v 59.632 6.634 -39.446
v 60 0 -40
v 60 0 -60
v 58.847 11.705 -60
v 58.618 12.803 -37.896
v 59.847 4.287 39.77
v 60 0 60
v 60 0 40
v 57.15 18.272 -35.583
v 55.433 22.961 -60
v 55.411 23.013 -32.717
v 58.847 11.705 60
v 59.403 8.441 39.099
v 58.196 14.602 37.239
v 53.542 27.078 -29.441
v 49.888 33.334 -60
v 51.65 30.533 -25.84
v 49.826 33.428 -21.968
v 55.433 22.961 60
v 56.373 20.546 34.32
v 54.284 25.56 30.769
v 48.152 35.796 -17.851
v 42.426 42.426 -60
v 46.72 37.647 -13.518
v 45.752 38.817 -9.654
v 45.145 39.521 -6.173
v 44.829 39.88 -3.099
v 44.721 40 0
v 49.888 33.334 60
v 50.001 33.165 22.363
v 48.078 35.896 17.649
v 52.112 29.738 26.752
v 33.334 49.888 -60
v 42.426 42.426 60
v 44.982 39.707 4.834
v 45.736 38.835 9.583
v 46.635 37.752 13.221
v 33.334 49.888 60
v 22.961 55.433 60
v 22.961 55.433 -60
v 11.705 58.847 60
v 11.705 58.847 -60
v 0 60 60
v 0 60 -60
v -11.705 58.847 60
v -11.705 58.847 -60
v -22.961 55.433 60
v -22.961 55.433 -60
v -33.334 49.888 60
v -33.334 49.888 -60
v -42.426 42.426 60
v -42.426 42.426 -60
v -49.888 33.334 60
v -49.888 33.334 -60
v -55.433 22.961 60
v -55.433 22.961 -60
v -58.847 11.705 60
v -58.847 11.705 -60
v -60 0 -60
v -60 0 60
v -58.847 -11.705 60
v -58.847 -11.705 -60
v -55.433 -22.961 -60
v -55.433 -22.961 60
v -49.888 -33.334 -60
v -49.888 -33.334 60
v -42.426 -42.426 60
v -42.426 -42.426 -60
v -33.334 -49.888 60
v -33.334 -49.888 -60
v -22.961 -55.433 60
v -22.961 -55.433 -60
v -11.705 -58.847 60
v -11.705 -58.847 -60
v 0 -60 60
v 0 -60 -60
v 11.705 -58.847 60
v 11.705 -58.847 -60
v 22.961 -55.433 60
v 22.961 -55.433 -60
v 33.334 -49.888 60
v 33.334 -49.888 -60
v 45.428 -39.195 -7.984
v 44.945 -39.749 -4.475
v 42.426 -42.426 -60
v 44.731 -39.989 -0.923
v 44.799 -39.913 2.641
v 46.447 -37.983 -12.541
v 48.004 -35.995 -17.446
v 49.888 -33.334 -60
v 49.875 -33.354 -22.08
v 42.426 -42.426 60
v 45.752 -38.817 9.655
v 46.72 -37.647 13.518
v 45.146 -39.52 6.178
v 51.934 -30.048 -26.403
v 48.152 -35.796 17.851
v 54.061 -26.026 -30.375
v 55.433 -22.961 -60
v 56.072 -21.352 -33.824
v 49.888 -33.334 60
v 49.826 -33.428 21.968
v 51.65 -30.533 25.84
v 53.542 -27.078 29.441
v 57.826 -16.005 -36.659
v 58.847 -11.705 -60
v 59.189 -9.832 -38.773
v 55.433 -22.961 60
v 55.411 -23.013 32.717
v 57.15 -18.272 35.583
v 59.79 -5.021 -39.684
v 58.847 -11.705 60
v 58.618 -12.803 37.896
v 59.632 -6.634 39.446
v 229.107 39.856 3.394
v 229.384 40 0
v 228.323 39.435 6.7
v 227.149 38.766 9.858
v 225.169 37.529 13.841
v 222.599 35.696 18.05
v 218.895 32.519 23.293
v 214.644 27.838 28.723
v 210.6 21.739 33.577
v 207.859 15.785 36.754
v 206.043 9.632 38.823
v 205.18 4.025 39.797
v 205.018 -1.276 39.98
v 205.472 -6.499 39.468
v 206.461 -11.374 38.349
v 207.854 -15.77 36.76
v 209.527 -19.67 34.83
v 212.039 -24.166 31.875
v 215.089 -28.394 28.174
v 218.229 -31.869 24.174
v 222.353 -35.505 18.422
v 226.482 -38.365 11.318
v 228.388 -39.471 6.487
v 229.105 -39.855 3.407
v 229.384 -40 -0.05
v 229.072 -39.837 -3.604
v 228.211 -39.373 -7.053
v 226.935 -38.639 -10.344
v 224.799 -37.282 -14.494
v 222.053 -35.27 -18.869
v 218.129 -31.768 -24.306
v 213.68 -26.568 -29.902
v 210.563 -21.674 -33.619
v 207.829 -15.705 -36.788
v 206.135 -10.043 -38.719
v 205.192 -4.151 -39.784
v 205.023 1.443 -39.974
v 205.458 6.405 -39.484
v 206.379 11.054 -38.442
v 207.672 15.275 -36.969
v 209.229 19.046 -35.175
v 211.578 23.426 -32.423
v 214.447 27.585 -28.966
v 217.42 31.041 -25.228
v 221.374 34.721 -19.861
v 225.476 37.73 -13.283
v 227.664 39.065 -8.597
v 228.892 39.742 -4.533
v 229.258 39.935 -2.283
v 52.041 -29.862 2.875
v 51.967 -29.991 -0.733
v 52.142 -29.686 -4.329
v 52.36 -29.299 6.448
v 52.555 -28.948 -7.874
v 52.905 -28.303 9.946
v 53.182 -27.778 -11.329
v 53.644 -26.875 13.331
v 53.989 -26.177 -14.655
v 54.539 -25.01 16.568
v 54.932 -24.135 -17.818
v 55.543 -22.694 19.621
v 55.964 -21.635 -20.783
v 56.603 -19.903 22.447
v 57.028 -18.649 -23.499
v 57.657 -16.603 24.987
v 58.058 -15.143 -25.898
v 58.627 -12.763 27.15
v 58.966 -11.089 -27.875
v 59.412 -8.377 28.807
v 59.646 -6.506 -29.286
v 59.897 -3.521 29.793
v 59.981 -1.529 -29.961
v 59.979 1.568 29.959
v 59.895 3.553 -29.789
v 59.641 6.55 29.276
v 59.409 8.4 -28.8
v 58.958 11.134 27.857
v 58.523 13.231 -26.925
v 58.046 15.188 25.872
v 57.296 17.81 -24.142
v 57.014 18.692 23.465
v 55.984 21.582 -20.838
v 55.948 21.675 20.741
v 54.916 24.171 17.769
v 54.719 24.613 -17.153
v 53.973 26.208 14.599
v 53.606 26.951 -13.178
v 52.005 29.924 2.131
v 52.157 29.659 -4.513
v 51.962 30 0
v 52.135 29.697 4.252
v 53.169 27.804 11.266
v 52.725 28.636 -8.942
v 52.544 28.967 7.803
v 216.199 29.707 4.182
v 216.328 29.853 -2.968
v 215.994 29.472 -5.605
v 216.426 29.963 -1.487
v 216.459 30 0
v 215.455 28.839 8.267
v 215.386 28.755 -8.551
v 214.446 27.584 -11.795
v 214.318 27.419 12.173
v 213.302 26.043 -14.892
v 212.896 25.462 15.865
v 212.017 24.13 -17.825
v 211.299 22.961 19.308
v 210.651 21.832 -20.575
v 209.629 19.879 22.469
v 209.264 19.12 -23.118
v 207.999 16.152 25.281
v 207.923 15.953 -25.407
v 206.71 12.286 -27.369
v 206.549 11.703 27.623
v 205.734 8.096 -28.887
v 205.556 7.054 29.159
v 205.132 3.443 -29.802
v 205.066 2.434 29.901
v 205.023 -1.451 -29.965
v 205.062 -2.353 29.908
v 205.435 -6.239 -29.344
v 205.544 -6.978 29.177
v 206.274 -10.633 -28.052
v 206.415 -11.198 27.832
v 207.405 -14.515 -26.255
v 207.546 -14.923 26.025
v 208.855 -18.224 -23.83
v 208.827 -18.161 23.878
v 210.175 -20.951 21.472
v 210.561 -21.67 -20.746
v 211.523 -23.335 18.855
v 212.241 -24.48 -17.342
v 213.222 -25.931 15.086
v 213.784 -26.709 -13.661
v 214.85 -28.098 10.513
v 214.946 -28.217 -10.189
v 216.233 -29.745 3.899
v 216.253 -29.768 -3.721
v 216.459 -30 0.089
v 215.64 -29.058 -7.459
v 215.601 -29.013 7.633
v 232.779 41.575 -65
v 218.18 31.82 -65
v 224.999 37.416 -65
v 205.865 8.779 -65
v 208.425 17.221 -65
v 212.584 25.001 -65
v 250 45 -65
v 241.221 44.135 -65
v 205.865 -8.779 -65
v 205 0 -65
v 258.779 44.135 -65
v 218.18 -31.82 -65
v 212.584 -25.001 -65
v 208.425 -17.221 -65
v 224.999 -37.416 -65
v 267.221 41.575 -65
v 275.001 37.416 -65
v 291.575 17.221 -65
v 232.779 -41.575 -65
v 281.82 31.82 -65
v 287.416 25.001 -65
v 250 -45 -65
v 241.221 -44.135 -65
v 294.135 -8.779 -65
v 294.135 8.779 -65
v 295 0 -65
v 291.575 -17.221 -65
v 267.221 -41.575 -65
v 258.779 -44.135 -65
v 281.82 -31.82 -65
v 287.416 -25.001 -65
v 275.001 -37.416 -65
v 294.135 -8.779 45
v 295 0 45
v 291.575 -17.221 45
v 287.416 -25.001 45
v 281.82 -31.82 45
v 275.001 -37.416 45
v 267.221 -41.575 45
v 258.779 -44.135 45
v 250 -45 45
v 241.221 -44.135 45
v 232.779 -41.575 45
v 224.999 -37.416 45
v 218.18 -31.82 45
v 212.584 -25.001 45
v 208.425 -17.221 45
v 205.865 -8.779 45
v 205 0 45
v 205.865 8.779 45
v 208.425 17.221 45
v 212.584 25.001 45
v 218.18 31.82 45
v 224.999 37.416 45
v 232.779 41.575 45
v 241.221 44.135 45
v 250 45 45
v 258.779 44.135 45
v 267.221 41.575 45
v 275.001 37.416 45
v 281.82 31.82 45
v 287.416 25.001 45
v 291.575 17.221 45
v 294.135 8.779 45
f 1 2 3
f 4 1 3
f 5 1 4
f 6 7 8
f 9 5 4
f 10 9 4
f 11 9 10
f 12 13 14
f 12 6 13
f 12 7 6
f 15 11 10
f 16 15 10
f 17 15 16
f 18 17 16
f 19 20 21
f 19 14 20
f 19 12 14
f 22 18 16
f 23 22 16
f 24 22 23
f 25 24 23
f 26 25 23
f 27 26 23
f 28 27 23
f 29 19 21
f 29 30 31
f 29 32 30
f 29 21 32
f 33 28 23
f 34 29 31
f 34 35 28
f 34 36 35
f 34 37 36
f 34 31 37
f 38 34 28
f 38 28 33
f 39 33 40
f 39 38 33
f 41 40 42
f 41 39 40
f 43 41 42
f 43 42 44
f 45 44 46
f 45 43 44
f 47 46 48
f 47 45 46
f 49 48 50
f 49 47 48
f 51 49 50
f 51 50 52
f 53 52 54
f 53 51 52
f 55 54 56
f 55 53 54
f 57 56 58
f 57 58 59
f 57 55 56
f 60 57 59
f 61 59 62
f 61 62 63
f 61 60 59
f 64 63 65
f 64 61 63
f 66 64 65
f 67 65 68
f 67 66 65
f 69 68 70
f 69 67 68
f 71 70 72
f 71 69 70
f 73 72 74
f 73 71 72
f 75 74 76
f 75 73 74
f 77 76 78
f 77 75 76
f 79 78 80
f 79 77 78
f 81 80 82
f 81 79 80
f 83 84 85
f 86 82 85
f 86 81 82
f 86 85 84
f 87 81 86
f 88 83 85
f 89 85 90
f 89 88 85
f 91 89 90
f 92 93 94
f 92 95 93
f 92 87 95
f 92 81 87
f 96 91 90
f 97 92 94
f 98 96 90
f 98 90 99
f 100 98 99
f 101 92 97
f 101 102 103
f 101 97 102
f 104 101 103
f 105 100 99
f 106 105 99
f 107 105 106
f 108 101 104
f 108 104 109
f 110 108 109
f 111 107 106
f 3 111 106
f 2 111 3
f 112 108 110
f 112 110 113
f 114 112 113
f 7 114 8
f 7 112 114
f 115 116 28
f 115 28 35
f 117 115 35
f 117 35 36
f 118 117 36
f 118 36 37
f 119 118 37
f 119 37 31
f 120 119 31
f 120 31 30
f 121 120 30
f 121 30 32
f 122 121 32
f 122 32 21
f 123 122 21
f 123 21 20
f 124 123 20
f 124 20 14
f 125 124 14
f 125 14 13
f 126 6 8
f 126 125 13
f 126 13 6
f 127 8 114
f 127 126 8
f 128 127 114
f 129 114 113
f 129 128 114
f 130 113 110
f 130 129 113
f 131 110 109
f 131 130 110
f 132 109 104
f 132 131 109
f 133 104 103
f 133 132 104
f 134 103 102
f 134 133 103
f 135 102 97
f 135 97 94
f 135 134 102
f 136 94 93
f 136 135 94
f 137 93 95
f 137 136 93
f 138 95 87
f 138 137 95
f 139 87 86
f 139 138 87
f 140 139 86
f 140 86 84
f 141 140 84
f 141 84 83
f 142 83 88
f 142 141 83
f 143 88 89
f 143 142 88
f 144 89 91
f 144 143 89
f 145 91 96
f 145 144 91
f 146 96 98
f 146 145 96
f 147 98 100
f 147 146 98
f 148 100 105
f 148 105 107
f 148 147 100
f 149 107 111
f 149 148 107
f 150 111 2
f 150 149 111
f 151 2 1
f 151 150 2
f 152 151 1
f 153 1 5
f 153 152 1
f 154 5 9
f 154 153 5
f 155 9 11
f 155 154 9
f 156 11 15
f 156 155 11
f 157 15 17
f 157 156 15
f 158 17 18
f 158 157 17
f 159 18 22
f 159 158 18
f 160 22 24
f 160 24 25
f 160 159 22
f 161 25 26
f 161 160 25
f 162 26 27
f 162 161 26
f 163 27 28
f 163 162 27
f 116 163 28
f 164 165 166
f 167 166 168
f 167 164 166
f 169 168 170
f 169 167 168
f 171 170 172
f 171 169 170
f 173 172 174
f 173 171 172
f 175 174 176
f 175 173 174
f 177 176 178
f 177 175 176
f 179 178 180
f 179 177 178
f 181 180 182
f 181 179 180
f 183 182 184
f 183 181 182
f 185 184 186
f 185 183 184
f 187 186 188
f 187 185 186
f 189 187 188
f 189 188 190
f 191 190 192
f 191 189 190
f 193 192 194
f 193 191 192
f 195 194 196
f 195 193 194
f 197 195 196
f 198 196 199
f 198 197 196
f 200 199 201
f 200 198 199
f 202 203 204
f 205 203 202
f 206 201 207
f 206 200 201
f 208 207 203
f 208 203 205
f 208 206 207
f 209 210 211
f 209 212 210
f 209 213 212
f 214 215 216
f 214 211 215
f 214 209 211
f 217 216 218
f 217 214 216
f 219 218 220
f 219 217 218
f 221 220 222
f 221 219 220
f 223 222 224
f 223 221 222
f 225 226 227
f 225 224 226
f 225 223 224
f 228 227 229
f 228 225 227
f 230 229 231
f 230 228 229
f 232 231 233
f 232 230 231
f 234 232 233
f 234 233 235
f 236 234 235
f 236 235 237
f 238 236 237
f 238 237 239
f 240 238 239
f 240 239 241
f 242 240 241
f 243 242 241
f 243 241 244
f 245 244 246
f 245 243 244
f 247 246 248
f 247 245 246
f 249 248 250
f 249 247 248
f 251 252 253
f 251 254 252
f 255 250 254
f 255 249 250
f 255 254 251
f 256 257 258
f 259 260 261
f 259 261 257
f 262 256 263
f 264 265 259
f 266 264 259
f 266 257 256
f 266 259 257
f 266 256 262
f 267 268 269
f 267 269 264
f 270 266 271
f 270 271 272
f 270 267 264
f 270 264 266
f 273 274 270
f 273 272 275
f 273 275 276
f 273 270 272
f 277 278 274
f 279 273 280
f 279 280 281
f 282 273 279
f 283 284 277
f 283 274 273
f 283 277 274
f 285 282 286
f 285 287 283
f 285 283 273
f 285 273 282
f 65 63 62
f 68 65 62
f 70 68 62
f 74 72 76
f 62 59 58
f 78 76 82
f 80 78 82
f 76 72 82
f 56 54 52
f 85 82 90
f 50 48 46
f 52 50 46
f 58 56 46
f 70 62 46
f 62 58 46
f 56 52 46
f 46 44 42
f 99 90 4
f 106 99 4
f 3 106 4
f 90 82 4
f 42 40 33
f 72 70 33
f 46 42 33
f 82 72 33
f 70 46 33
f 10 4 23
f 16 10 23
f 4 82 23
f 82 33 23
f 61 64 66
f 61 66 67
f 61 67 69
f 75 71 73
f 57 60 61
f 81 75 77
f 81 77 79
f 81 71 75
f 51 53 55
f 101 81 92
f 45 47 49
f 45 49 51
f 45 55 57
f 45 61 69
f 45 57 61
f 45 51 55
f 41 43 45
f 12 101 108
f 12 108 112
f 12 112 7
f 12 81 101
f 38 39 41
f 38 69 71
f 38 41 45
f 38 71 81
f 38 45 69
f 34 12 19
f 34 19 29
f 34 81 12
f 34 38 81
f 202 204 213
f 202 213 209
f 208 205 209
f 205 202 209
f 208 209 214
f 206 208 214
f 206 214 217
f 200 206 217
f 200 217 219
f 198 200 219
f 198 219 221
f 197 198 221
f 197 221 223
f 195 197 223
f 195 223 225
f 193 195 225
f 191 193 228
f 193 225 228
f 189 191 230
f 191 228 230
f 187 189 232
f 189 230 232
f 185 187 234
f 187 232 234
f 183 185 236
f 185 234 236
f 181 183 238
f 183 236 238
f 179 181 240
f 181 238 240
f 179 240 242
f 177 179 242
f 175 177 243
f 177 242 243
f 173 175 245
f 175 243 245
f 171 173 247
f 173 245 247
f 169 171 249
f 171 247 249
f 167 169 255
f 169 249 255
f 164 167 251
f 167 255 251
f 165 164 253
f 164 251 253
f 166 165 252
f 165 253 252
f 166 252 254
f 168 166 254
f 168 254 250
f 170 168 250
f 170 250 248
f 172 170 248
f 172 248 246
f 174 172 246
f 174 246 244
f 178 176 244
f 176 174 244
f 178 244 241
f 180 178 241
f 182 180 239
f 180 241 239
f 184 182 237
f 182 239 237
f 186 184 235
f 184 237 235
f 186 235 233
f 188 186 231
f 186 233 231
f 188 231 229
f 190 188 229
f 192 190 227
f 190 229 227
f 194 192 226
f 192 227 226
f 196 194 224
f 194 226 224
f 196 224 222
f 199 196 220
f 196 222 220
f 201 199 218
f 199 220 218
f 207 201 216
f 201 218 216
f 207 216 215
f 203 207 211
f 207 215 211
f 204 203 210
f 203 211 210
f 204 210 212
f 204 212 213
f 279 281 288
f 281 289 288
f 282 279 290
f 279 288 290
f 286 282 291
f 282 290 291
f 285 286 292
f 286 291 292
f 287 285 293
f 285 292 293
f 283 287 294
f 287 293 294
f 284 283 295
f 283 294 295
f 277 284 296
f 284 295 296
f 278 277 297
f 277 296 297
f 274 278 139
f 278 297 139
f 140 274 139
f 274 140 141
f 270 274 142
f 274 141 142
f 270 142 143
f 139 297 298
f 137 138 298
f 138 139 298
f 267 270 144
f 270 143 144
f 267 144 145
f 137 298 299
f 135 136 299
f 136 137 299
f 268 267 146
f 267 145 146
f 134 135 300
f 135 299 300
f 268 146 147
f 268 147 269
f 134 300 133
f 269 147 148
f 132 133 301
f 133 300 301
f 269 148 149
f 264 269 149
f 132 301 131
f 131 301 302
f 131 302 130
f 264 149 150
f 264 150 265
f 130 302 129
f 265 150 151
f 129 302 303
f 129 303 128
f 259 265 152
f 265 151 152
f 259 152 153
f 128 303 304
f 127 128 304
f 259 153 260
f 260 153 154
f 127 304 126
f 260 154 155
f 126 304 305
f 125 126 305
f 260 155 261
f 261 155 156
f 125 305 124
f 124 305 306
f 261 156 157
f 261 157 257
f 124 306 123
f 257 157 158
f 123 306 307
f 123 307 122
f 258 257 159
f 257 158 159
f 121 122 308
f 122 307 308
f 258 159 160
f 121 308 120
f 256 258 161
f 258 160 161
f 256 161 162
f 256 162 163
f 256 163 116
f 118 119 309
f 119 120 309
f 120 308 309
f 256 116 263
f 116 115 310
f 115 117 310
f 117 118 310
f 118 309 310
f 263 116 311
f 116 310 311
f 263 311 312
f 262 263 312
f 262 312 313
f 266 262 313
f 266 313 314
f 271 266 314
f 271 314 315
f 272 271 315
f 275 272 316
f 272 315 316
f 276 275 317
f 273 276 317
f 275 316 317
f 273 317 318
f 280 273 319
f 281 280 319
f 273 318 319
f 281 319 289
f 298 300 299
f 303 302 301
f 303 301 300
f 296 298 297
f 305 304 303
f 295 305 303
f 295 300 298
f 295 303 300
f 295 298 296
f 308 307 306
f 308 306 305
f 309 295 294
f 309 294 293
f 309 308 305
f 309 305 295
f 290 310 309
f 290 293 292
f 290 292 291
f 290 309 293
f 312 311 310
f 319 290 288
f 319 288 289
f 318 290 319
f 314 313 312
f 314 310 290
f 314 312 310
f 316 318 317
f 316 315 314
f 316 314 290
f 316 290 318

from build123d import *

# Parameters (mm, degrees)
SKETCH_W     = 250
SKETCH_H     = 10
SKETCH001_R  = 60
PAD_DEPTH    = 60
SKETCH002_R  = 45
PAD001_DEPTH = 45
SKETCH003_R  = 45
PAD002_DEPTH = 20


with BuildPart() as part:
    # Sketch → Revolution (revolve)
    with BuildSketch(Plane.XY):
        with Locations((125, 35)):
            Rectangle(SKETCH_W, SKETCH_H)
    revolve(axis=Axis((0, 0, 0), (1, 0, 0)))

    # Sketch001 → Pad (new body, symmetric)
    with BuildSketch(Plane.XY):
        Circle(SKETCH001_R)
    extrude(amount=PAD_DEPTH, both=True)

    # Sketch002 → Pad001 (join, symmetric)
    with BuildSketch(Plane.XY):
        with Locations((250, 0)):
            Circle(SKETCH002_R)
    extrude(amount=PAD001_DEPTH, both=True)

    # Sketch003 (on Face6 of Pad001) → Pad002 (join)
    with BuildSketch(Plane(origin=(0, 0, -45), x_dir=(1, 0, 0), z_dir=(0, 0, -1))):
        with Locations((250, 0)):
            Circle(SKETCH003_R)
    extrude(amount=PAD002_DEPTH)


solid = part.part
